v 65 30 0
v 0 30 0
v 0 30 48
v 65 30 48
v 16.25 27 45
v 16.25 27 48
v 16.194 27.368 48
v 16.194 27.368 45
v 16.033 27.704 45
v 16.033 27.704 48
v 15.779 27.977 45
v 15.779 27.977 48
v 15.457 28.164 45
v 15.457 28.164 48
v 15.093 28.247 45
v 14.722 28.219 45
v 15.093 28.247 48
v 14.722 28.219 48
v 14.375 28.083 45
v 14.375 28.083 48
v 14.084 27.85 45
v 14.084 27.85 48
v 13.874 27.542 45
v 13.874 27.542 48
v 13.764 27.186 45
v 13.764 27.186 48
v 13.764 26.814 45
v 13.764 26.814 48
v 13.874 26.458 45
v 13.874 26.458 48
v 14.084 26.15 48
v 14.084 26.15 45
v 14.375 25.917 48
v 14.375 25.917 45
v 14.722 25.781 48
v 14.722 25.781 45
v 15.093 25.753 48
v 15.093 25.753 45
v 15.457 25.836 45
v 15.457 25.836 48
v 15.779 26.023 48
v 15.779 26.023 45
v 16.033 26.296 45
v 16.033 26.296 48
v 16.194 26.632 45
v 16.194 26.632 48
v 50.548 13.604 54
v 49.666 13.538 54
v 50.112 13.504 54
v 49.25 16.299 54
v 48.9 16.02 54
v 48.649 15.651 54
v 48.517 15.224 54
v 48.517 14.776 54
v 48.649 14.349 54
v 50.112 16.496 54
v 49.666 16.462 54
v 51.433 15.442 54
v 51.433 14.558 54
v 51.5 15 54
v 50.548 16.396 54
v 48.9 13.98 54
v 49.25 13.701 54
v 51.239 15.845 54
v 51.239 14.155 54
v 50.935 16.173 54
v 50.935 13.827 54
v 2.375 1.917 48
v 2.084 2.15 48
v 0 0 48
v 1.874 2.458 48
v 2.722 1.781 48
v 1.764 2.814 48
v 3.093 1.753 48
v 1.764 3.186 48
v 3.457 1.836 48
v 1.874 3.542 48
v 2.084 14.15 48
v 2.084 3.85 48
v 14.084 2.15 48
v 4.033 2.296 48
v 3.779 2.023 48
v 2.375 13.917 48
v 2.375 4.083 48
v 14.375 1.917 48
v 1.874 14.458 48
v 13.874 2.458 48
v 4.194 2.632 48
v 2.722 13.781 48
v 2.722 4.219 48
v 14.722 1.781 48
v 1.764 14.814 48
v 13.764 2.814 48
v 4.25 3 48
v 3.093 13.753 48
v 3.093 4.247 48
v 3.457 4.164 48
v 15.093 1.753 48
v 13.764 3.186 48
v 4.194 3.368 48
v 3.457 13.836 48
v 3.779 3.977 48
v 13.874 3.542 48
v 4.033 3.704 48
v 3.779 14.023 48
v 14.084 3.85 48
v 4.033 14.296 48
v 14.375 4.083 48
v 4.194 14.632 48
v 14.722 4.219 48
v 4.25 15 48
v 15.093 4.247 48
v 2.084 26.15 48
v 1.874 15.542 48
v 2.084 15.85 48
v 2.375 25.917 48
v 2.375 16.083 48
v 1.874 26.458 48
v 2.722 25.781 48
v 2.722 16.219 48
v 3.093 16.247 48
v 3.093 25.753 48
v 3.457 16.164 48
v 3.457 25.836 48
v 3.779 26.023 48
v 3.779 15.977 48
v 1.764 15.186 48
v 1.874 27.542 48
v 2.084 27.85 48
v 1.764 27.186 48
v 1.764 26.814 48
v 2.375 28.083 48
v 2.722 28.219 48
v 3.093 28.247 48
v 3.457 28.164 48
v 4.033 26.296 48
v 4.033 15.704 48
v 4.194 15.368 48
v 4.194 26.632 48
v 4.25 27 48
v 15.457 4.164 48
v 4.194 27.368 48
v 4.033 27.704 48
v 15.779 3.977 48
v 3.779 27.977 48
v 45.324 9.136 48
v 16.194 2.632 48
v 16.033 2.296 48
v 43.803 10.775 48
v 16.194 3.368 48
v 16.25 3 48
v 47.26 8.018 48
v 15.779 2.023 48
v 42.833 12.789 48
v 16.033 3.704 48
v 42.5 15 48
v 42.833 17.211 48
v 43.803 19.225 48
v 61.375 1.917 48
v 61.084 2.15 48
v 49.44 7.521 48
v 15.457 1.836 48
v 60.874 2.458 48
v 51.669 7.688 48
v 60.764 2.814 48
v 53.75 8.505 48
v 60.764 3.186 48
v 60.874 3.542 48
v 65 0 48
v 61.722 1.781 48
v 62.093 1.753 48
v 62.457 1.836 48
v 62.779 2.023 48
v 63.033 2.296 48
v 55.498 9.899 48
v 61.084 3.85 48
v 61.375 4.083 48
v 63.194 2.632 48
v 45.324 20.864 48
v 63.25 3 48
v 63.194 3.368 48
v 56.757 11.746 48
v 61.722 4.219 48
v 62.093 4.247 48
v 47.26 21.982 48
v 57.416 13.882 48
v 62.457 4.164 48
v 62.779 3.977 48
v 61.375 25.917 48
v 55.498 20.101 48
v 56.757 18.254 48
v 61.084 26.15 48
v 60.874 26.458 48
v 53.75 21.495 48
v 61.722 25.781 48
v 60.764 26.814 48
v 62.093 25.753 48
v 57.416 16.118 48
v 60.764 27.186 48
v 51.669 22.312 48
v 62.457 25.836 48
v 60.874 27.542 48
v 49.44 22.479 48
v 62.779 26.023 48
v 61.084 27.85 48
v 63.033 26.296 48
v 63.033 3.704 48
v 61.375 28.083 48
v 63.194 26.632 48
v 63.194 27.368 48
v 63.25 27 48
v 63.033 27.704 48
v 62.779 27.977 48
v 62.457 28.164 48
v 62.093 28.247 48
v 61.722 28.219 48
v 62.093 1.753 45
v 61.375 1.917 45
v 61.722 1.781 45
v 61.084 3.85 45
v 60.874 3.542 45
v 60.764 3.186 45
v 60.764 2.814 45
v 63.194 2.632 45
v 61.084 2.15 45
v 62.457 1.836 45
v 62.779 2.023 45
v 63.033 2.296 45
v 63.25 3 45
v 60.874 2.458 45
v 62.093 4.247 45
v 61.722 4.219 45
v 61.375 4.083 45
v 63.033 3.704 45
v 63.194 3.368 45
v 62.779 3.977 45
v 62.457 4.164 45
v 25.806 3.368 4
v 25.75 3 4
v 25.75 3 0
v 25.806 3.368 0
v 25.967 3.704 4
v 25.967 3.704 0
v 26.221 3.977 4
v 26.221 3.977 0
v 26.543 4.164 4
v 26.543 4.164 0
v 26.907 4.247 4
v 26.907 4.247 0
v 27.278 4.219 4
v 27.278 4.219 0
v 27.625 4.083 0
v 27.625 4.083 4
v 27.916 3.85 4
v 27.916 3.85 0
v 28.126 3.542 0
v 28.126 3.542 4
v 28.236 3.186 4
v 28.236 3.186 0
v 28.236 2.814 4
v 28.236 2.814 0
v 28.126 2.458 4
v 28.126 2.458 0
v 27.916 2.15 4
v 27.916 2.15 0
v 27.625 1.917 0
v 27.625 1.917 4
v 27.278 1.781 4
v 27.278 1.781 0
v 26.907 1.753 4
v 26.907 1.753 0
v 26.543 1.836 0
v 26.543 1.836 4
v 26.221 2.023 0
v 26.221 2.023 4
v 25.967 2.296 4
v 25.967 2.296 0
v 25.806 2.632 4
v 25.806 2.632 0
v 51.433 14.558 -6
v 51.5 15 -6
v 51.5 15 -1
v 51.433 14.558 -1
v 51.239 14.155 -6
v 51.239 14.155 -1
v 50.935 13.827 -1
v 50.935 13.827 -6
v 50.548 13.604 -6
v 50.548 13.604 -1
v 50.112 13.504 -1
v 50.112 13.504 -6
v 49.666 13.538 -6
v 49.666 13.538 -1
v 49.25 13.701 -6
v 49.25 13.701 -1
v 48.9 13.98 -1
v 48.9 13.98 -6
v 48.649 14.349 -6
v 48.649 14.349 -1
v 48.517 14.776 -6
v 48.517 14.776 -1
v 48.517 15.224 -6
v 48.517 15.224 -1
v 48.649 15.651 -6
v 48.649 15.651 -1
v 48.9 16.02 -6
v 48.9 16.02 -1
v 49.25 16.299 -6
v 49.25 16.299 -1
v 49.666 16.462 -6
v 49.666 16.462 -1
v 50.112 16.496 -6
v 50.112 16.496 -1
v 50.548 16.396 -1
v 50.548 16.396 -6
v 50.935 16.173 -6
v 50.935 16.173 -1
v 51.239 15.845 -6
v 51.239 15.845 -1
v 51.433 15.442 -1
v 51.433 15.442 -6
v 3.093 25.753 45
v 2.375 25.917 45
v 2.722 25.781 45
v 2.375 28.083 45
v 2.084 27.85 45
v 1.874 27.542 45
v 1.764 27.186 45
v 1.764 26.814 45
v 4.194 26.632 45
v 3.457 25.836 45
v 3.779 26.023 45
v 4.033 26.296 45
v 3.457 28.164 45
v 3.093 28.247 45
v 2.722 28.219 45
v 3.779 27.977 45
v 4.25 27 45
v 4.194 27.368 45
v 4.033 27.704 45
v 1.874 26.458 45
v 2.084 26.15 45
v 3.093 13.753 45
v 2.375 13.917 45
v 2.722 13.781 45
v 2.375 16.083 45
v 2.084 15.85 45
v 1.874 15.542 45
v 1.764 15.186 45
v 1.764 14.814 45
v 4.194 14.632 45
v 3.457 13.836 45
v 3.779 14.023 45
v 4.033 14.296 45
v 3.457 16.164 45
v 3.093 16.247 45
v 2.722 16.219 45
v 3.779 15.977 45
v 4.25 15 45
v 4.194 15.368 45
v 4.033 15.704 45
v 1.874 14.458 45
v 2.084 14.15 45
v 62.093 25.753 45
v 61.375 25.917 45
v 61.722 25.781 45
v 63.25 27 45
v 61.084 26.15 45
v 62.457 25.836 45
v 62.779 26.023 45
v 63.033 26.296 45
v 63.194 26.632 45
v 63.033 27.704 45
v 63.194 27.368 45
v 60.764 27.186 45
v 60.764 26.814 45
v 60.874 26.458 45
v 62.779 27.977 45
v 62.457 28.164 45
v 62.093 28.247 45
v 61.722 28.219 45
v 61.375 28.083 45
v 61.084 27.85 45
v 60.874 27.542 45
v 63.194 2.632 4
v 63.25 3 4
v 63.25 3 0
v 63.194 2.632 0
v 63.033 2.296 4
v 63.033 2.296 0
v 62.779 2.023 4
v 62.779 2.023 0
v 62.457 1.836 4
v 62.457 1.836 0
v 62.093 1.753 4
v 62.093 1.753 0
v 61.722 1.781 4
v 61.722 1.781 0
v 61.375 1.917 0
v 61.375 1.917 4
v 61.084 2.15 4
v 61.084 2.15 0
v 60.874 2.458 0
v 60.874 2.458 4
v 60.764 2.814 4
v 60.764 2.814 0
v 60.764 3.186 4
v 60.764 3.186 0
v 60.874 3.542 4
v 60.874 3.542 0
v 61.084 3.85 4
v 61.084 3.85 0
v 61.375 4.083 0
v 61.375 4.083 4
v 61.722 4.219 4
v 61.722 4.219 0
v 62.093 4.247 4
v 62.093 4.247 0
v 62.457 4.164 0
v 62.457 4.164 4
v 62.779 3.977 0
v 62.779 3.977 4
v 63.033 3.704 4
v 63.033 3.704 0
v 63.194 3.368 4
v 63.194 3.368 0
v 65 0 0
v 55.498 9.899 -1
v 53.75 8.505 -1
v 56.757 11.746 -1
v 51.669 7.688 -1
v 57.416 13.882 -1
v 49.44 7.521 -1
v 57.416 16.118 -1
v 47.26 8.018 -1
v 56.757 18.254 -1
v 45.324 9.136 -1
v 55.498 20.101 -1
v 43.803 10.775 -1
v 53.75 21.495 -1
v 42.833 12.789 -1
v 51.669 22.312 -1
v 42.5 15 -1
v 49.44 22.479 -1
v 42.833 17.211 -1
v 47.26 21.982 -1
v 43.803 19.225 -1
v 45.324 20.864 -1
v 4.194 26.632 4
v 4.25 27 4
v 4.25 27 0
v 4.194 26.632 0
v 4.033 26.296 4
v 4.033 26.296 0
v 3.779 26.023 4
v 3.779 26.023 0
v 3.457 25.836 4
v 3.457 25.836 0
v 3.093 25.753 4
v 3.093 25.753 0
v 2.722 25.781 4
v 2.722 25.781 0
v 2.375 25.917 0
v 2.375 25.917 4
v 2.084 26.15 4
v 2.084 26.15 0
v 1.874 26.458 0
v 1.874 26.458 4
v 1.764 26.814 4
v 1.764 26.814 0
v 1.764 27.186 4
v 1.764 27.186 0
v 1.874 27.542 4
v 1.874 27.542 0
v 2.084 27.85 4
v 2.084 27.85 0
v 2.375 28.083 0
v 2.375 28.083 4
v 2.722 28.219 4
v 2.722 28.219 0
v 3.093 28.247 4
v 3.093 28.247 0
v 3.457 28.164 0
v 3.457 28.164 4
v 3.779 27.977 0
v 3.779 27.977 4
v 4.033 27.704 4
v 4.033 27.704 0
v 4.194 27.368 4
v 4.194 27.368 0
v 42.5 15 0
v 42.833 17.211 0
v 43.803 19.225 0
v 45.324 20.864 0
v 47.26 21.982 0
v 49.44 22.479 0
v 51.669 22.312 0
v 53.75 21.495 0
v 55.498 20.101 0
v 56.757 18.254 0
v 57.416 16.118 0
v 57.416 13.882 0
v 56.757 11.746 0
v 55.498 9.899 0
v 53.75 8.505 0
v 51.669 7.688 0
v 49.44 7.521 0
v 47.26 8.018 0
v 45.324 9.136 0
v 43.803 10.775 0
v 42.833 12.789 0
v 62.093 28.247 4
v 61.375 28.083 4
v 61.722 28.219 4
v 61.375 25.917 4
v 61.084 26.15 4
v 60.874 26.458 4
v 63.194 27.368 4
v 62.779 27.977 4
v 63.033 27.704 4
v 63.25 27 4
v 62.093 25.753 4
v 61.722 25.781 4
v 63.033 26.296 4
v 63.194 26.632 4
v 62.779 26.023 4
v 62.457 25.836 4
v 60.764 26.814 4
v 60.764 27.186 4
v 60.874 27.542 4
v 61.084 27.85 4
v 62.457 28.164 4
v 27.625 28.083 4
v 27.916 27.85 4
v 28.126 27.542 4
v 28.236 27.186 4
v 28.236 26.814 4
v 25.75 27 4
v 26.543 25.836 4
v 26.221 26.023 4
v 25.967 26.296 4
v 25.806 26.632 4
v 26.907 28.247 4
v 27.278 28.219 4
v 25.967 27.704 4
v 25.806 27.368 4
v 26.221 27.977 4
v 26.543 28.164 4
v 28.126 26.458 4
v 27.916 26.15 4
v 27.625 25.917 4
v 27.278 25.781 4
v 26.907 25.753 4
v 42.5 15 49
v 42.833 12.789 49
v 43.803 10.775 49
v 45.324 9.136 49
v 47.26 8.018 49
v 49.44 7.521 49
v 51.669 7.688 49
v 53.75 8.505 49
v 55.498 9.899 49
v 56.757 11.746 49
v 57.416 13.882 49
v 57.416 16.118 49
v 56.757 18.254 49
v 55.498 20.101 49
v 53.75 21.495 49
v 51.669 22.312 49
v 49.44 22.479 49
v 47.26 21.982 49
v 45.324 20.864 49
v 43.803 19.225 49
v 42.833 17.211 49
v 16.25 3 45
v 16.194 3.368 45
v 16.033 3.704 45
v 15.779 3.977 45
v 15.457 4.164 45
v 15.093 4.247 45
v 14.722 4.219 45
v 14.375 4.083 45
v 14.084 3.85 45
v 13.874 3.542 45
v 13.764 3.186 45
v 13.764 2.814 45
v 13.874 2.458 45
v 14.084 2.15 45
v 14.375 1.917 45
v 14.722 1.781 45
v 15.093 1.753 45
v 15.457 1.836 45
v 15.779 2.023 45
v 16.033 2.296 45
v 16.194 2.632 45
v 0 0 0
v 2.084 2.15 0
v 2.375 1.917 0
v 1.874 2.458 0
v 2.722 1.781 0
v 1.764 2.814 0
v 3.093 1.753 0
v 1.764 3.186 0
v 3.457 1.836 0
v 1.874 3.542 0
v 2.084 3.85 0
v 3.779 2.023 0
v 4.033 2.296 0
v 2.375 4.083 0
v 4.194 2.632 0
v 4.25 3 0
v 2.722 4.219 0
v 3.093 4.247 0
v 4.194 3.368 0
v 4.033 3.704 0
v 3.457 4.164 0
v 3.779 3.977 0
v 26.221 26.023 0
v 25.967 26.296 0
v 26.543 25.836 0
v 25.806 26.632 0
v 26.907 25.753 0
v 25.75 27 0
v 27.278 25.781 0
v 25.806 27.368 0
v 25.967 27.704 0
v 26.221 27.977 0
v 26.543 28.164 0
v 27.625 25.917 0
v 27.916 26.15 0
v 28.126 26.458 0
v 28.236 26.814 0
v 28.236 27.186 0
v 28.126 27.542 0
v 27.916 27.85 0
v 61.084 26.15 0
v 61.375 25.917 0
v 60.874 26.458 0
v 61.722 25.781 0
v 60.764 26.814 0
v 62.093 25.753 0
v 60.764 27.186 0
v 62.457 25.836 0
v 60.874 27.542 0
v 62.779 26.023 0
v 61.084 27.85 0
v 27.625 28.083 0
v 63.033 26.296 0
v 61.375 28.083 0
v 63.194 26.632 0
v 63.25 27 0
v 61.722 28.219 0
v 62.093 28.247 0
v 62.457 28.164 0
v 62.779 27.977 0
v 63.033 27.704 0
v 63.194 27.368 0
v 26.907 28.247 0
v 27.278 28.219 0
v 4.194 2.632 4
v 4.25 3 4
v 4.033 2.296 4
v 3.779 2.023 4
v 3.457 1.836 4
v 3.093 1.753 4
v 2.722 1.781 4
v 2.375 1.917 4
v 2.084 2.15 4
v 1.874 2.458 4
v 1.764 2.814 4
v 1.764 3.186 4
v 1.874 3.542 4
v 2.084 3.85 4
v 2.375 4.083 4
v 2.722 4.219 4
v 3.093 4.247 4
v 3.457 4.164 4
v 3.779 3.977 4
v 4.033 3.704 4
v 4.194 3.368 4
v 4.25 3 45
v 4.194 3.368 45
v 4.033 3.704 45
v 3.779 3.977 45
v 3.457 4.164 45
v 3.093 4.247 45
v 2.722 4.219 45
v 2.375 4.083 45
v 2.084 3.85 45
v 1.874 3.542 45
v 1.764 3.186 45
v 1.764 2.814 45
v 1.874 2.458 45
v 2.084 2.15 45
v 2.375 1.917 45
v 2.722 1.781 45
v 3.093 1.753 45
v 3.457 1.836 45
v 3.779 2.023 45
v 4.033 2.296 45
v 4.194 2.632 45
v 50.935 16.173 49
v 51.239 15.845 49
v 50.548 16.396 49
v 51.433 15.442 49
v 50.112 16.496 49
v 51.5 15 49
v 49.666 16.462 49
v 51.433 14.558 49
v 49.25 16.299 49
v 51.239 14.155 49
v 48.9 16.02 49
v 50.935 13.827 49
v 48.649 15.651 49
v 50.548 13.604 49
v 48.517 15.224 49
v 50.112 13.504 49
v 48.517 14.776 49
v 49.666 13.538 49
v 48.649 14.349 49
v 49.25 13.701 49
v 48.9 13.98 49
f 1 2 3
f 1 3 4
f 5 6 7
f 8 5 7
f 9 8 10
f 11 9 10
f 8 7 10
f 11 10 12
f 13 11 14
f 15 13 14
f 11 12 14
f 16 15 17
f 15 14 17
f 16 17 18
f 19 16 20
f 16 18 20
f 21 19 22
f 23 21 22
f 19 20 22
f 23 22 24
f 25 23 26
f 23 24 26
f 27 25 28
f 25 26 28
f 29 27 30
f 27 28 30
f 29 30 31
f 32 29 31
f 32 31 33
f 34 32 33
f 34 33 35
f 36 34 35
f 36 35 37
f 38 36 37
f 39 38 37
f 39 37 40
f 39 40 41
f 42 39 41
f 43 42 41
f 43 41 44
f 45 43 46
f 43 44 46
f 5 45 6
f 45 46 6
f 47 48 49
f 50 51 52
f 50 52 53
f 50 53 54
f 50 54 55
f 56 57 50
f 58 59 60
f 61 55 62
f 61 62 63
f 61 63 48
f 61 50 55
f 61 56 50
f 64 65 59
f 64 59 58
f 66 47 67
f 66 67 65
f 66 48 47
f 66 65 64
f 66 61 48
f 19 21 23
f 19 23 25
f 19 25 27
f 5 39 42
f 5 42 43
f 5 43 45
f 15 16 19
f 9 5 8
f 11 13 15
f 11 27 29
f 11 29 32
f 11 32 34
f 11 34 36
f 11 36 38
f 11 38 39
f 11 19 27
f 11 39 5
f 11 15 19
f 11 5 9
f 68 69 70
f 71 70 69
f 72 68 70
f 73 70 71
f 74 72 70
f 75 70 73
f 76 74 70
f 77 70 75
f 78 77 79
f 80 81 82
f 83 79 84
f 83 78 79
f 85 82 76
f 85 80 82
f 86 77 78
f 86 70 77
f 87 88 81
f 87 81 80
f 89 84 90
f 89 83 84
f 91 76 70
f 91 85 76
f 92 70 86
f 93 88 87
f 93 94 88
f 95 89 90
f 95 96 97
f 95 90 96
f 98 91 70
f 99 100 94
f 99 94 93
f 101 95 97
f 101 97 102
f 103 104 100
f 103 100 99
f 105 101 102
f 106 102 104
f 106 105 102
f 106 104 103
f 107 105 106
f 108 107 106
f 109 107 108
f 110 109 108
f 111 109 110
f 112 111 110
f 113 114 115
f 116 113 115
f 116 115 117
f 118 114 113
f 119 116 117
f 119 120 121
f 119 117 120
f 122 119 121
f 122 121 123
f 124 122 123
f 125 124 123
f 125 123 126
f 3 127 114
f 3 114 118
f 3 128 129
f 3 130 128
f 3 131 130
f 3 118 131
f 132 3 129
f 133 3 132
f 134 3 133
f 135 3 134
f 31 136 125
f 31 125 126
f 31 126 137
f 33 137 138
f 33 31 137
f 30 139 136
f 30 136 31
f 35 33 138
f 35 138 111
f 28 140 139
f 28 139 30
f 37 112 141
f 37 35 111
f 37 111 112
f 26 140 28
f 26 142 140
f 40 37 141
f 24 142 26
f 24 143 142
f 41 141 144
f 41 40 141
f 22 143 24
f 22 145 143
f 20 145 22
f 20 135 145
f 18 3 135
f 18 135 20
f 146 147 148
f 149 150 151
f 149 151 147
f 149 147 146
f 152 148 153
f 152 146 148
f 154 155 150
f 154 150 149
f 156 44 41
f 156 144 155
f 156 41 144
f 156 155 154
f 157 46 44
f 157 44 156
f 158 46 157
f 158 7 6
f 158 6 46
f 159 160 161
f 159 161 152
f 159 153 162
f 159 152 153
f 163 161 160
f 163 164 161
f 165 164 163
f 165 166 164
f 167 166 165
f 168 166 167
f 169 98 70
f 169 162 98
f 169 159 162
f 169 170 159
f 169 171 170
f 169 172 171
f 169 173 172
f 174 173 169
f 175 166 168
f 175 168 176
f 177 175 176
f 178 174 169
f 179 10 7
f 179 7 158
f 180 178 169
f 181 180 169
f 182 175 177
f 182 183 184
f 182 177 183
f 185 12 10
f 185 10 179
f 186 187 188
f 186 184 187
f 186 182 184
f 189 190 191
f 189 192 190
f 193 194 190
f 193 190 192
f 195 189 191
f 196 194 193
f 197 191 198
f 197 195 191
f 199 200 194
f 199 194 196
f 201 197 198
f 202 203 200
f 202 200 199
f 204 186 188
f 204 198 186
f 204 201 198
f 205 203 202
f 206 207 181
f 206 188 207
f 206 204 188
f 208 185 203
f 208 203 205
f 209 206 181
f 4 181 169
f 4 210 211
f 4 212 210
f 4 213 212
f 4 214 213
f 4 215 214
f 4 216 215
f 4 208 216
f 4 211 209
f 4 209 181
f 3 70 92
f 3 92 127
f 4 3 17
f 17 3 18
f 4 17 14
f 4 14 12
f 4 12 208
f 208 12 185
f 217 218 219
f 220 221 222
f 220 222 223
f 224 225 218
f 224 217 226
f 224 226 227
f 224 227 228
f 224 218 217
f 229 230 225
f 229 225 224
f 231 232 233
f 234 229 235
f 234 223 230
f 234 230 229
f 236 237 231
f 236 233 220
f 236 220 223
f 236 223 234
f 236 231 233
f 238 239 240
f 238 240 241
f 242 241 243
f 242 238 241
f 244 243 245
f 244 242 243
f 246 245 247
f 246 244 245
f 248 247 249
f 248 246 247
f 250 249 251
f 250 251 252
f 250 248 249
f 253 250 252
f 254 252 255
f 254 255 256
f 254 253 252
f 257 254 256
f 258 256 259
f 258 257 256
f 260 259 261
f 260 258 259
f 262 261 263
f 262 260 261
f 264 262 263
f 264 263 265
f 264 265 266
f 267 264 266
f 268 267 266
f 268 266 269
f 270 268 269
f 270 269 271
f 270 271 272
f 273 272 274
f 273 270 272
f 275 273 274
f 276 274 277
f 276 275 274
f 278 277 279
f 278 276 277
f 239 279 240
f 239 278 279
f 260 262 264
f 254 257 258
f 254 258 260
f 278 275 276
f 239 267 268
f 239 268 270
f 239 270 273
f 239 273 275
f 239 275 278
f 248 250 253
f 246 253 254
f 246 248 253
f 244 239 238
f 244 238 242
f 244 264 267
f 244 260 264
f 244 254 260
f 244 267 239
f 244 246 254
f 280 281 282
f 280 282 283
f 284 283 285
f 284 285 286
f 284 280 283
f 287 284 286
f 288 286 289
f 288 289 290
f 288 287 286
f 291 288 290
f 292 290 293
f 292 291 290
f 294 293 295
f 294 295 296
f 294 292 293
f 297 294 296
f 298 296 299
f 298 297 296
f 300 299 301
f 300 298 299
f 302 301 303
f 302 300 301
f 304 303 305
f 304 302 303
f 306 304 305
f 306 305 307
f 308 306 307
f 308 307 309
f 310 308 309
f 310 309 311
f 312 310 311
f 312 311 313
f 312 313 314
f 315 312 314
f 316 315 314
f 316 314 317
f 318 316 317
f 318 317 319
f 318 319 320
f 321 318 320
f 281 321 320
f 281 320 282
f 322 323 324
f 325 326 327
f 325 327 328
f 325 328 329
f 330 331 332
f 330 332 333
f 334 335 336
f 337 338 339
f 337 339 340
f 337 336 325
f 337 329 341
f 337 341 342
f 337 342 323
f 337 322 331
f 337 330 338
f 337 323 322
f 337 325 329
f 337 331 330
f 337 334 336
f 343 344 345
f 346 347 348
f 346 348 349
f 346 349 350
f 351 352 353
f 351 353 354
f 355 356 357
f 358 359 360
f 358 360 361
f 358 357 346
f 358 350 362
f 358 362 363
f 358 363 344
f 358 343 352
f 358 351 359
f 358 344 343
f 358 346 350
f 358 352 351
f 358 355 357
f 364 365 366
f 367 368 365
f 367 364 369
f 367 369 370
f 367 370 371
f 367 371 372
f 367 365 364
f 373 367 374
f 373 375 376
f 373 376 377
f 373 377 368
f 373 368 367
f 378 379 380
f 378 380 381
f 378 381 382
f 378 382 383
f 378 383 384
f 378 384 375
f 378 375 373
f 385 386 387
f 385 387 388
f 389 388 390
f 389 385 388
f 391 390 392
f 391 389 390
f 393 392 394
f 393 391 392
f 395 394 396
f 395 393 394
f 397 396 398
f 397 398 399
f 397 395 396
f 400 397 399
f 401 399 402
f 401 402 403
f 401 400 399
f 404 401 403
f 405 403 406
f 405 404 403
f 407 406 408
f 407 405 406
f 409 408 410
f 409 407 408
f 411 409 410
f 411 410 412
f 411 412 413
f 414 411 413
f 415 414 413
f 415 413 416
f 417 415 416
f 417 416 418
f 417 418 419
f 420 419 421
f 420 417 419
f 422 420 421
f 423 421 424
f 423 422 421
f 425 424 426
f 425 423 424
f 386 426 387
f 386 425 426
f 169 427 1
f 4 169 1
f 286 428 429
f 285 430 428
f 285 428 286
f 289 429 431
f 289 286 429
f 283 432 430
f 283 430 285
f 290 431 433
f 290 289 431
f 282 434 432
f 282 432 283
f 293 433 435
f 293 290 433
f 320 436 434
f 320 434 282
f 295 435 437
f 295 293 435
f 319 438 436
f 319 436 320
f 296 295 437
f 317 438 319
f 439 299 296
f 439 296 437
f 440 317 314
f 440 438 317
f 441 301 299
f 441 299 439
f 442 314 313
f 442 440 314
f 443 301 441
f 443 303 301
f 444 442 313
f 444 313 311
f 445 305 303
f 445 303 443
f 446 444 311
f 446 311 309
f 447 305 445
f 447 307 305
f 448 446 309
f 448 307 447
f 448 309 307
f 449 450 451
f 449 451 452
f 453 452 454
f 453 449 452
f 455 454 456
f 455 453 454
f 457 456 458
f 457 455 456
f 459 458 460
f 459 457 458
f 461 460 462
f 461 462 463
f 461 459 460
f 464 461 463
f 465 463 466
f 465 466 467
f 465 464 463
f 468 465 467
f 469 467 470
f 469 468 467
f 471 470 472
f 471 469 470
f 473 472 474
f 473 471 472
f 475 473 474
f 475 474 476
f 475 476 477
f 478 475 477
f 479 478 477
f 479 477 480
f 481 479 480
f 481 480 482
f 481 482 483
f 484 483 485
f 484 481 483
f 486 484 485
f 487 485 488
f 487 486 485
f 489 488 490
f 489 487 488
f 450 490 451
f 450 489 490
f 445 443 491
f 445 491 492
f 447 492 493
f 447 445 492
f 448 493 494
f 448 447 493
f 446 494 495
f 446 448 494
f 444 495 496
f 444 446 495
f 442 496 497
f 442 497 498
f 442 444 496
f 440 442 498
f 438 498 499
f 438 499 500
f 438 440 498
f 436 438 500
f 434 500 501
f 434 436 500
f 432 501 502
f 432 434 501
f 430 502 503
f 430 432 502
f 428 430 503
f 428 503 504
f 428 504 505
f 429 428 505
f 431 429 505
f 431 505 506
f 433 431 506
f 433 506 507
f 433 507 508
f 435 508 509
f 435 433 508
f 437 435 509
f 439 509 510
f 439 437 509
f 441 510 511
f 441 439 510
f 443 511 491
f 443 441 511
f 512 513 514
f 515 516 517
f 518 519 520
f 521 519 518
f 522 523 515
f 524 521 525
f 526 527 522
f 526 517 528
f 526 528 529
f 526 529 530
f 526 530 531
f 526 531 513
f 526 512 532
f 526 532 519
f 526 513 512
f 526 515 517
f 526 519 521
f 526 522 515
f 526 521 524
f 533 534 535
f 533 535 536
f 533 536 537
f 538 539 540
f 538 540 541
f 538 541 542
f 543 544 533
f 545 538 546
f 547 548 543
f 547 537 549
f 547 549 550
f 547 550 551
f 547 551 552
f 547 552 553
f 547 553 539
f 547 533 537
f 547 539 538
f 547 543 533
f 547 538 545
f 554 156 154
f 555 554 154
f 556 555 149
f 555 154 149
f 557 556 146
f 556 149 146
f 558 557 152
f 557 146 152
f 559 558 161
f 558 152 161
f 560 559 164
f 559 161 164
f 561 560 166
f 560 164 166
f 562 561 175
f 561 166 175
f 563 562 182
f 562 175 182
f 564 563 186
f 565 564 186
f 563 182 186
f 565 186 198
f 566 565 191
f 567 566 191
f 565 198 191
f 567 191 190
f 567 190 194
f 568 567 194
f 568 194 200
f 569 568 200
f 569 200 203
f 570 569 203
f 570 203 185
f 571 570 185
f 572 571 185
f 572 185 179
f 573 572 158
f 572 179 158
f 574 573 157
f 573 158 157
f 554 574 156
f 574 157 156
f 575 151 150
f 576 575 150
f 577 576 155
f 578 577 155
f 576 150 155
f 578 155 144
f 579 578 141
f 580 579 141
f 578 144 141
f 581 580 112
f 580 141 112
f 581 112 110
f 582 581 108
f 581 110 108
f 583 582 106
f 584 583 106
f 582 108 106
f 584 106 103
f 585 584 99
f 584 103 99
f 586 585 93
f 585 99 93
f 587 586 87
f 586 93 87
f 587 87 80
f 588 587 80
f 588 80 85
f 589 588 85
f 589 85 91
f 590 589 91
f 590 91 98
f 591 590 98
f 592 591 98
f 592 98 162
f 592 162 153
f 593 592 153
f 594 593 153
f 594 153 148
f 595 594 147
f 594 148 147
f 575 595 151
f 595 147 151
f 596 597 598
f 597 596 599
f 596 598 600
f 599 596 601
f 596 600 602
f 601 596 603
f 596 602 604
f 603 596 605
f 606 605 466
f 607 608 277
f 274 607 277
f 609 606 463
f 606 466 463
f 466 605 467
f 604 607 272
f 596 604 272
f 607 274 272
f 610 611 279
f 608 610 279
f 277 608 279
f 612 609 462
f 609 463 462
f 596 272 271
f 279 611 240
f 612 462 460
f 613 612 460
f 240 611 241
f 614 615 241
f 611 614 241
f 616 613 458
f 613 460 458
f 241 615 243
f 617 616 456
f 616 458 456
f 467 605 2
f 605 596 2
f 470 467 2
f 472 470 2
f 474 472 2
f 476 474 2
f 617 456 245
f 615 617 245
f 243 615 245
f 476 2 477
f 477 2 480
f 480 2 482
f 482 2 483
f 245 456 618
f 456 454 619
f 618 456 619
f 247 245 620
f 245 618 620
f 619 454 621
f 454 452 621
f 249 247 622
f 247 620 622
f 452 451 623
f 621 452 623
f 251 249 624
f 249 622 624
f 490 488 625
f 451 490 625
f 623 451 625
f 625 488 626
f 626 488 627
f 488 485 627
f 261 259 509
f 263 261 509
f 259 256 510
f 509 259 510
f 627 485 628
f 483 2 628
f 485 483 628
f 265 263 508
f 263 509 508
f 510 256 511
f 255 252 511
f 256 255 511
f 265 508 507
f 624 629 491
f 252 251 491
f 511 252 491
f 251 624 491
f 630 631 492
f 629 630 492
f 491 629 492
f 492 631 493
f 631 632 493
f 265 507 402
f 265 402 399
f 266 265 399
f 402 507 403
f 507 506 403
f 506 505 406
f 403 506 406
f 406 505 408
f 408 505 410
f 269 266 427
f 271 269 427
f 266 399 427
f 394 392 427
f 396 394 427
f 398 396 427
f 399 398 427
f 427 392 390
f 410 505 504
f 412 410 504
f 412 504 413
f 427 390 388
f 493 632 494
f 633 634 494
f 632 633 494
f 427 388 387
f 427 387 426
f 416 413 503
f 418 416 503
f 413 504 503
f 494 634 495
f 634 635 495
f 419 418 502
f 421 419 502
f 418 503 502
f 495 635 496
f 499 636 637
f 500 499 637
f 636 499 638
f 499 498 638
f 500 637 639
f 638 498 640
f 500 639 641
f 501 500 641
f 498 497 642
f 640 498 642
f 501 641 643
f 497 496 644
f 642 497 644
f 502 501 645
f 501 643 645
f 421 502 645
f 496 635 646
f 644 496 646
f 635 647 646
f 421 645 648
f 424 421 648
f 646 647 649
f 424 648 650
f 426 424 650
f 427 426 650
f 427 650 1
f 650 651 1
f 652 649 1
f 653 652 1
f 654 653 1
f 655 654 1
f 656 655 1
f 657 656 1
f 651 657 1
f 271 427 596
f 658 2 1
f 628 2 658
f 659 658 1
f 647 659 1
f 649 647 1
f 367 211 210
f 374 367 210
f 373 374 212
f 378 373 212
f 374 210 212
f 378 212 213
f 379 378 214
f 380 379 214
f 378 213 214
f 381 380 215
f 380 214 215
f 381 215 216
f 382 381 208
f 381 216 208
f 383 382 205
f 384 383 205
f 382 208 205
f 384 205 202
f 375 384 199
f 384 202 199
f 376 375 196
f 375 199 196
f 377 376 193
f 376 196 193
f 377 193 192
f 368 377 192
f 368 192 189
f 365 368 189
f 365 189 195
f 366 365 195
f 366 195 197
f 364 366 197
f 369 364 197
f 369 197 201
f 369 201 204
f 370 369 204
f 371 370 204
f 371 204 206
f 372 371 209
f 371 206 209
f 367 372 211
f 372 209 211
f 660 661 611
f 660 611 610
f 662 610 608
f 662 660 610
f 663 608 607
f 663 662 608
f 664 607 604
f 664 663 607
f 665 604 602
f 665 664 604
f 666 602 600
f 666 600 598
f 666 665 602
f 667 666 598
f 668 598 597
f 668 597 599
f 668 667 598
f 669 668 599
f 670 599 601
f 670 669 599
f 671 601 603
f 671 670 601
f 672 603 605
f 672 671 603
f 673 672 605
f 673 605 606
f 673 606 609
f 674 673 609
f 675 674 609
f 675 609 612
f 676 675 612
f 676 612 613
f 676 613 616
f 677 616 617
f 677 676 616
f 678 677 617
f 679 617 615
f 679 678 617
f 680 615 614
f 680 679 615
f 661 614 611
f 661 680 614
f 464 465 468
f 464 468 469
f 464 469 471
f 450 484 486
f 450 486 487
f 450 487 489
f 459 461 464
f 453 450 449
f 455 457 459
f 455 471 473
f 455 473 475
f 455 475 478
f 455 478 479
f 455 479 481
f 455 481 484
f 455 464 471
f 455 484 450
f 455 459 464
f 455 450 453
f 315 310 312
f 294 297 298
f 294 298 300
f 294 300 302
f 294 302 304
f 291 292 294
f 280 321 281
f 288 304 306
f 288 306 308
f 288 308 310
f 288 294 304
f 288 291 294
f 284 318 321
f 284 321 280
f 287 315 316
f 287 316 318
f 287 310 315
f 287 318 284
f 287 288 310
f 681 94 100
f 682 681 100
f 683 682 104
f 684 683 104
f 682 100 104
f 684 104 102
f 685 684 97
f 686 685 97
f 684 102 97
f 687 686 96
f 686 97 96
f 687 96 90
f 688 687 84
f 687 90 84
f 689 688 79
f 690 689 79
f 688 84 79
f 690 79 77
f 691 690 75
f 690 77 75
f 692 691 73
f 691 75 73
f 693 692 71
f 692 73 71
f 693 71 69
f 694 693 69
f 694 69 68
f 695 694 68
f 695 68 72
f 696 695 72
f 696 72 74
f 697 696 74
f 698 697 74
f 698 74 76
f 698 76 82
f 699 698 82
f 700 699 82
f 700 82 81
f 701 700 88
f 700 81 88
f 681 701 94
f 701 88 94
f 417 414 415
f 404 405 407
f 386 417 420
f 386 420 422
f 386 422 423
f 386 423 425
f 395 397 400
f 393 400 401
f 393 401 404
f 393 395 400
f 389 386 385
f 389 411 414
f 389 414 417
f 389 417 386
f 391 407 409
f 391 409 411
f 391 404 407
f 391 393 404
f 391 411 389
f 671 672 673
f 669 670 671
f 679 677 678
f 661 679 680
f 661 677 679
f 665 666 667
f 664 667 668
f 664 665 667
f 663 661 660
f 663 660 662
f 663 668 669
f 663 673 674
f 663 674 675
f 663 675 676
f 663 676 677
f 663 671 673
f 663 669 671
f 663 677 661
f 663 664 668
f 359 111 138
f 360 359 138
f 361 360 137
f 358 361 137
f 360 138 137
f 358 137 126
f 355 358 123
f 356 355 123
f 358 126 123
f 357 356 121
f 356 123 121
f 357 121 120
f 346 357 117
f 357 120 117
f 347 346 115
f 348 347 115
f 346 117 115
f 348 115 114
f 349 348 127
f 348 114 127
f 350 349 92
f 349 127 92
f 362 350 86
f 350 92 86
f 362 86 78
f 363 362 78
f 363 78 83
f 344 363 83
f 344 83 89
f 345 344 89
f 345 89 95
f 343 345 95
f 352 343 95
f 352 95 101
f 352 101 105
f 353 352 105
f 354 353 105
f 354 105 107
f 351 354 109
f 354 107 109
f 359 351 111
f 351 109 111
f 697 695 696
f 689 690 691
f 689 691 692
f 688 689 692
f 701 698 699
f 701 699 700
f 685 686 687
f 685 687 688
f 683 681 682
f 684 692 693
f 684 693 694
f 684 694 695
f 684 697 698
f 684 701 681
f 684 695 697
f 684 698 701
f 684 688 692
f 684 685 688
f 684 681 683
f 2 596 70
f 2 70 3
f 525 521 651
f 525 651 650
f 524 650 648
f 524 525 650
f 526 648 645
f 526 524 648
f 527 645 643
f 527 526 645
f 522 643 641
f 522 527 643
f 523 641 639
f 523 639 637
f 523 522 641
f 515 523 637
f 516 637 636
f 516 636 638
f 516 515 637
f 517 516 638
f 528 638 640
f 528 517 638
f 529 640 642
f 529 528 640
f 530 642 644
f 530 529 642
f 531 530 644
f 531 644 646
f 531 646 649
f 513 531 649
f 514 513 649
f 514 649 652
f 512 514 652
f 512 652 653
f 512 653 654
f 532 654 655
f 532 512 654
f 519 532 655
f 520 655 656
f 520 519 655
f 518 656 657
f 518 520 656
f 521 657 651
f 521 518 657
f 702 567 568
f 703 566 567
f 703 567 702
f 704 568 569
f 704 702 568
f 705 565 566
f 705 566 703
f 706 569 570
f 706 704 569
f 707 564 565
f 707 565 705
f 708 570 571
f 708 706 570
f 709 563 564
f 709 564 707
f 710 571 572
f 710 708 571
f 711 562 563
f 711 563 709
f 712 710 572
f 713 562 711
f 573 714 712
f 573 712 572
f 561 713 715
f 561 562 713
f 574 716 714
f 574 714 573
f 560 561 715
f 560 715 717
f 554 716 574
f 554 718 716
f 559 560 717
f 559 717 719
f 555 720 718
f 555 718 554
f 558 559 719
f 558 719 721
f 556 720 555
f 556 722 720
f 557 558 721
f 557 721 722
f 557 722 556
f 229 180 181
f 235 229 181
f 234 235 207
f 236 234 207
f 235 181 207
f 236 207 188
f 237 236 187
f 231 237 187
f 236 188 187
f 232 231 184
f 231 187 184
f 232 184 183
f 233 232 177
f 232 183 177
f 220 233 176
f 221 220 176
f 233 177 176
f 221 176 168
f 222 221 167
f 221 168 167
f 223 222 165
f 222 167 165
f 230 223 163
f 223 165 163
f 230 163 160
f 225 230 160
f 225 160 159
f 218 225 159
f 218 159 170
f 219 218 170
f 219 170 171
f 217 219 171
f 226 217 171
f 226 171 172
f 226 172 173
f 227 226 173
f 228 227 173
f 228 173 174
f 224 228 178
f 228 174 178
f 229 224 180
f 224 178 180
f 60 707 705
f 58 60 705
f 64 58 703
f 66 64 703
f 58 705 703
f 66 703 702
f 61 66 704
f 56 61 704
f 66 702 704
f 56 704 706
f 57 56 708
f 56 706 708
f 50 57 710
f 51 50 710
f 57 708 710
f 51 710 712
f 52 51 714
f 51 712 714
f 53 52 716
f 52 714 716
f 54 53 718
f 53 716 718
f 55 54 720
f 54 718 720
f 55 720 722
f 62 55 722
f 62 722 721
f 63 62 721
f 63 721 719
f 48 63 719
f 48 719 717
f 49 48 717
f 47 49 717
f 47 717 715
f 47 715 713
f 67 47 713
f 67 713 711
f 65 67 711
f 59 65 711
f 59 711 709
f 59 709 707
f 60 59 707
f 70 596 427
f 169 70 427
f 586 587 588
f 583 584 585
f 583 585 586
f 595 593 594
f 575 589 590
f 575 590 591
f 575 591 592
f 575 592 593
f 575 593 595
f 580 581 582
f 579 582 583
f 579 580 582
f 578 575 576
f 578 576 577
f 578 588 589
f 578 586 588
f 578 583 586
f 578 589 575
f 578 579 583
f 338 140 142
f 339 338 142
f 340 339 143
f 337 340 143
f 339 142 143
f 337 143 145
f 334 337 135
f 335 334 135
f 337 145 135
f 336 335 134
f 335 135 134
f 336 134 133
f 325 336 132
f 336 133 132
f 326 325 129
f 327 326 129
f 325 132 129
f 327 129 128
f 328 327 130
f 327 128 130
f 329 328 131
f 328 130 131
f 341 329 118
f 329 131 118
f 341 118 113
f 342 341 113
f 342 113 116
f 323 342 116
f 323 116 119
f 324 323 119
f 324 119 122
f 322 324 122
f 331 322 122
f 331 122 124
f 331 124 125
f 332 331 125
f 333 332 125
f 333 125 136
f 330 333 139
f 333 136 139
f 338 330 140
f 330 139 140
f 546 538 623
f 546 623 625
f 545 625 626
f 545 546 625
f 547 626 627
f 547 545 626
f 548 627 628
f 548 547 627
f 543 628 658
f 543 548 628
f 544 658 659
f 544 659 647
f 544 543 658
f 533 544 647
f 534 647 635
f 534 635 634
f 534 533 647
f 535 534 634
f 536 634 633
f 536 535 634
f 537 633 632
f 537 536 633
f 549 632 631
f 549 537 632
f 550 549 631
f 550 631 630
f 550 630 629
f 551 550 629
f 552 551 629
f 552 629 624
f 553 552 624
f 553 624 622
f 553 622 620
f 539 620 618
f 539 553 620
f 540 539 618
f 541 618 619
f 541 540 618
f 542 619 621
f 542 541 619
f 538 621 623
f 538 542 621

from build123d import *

# Parameters (mm, degrees)
SKETCH_1_W          = 65
SKETCH_1_H          = 30
EXTRUDE_1_DEPTH     = 48
SKETCH_2_R          = 1.25
CUT_EXTRUDE_1_DEPTH = 3
SKETCH_3_R          = 7.5
SKETCH_3_R_2        = 1.5
EXTRUDE_2_DEPTH     = 1
SKETCH_4_R          = 1.5
EXTRUDE_3_DEPTH     = 6
CUT_EXTRUDE_START   = -4
SKETCH_5_R          = 1.25
CUT_EXTRUDE_2_DEPTH = 4
EXTRUDE_START       = 1
SKETCH_6_R          = 7.5
SKETCH_6_R_2        = 1.5
EXTRUDE_4_DEPTH     = 1
EXTRUDE_START_2     = 6
SKETCH_7_R          = 1.5
EXTRUDE_5_DEPTH     = 6


with BuildPart() as part:
    # ｽｹｯﾁ1 → ﾎﾞｽ - 押し出し1 (new body)
    with BuildSketch(Plane.XY):
        with Locations((32.5, 15)):
            Rectangle(SKETCH_1_W, SKETCH_1_H)
    extrude(amount=EXTRUDE_1_DEPTH)

    # ｽｹｯﾁ2 → ｶｯﾄ - 押し出し1 (cut)
    with BuildSketch(Plane.XY.offset(48)):
        with Locations((3, 27)):
            Circle(SKETCH_2_R)
        with Locations((15, 27)):
            Circle(SKETCH_2_R)
        with Locations((3, 3)):
            Circle(SKETCH_2_R)
        with Locations((3, 15)):
            Circle(SKETCH_2_R)
        with Locations((15, 3)):
            Circle(SKETCH_2_R)
        with Locations((62, 27)):
            Circle(SKETCH_2_R)
        with Locations((62, 3)):
            Circle(SKETCH_2_R)
    extrude(amount=-CUT_EXTRUDE_1_DEPTH, mode=Mode.SUBTRACT)

    # ｽｹｯﾁ3 → ﾎﾞｽ - 押し出し2 (add)
    with BuildSketch(Plane.XY.offset(48)):
        with Locations(Location((50, 15, 0), (0, 0, 180))):
            Circle(SKETCH_3_R)
        with Locations((50, 15)):
            Circle(SKETCH_3_R_2, mode=Mode.SUBTRACT)
    extrude(amount=EXTRUDE_2_DEPTH)

    # ｽｹｯﾁ4 → ﾎﾞｽ - 押し出し3 (add)
    with BuildSketch(Plane.XY.offset(48)):
        with Locations((50, 15)):
            Circle(SKETCH_4_R)
    extrude(amount=EXTRUDE_3_DEPTH)

    # ｽｹｯﾁ5 → ｶｯﾄ - 押し出し2 (cut)
    with BuildSketch(Plane(origin=(0, 0, 0), x_dir=(-1, 0, 0), z_dir=(0, 0, -1)).offset(CUT_EXTRUDE_START)):
        with Locations(Location((-3, 3, 0), (0, 0, 180))):
            Circle(SKETCH_5_R)
        with Locations(Location((-3, 27, 0), (0, 0, 180))):
            Circle(SKETCH_5_R)
        with Locations((-27, 27)):
            Circle(SKETCH_5_R)
        with Locations((-27, 3)):
            Circle(SKETCH_5_R)
        with Locations(Location((-62, 27, 0), (0, 0, 180))):
            Circle(SKETCH_5_R)
        with Locations(Location((-62, 3, 0), (0, 0, 180))):
            Circle(SKETCH_5_R)
    extrude(amount=CUT_EXTRUDE_2_DEPTH, mode=Mode.SUBTRACT)

    # ｽｹｯﾁ6 → ﾎﾞｽ - 押し出し4 (add)
    with BuildSketch(Plane(origin=(0, 0, 0), x_dir=(-1, 0, 0), z_dir=(0, 0, -1)).offset(EXTRUDE_START)):
        with Locations((-50, 15)):
            Circle(SKETCH_6_R)
        with Locations(Location((-50, 15, 0), (0, 0, 180))):
            Circle(SKETCH_6_R_2, mode=Mode.SUBTRACT)
    extrude(amount=-EXTRUDE_4_DEPTH)

    # ｽｹｯﾁ7 → ﾎﾞｽ - 押し出し5 (add)
    with BuildSketch(Plane(origin=(0, 0, 0), x_dir=(-1, 0, 0), z_dir=(0, 0, -1)).offset(EXTRUDE_START_2)):
        with Locations(Location((-50, 15, 0), (0, 0, 180))):
            Circle(SKETCH_7_R)
    extrude(amount=-EXTRUDE_5_DEPTH)


solid = part.part
